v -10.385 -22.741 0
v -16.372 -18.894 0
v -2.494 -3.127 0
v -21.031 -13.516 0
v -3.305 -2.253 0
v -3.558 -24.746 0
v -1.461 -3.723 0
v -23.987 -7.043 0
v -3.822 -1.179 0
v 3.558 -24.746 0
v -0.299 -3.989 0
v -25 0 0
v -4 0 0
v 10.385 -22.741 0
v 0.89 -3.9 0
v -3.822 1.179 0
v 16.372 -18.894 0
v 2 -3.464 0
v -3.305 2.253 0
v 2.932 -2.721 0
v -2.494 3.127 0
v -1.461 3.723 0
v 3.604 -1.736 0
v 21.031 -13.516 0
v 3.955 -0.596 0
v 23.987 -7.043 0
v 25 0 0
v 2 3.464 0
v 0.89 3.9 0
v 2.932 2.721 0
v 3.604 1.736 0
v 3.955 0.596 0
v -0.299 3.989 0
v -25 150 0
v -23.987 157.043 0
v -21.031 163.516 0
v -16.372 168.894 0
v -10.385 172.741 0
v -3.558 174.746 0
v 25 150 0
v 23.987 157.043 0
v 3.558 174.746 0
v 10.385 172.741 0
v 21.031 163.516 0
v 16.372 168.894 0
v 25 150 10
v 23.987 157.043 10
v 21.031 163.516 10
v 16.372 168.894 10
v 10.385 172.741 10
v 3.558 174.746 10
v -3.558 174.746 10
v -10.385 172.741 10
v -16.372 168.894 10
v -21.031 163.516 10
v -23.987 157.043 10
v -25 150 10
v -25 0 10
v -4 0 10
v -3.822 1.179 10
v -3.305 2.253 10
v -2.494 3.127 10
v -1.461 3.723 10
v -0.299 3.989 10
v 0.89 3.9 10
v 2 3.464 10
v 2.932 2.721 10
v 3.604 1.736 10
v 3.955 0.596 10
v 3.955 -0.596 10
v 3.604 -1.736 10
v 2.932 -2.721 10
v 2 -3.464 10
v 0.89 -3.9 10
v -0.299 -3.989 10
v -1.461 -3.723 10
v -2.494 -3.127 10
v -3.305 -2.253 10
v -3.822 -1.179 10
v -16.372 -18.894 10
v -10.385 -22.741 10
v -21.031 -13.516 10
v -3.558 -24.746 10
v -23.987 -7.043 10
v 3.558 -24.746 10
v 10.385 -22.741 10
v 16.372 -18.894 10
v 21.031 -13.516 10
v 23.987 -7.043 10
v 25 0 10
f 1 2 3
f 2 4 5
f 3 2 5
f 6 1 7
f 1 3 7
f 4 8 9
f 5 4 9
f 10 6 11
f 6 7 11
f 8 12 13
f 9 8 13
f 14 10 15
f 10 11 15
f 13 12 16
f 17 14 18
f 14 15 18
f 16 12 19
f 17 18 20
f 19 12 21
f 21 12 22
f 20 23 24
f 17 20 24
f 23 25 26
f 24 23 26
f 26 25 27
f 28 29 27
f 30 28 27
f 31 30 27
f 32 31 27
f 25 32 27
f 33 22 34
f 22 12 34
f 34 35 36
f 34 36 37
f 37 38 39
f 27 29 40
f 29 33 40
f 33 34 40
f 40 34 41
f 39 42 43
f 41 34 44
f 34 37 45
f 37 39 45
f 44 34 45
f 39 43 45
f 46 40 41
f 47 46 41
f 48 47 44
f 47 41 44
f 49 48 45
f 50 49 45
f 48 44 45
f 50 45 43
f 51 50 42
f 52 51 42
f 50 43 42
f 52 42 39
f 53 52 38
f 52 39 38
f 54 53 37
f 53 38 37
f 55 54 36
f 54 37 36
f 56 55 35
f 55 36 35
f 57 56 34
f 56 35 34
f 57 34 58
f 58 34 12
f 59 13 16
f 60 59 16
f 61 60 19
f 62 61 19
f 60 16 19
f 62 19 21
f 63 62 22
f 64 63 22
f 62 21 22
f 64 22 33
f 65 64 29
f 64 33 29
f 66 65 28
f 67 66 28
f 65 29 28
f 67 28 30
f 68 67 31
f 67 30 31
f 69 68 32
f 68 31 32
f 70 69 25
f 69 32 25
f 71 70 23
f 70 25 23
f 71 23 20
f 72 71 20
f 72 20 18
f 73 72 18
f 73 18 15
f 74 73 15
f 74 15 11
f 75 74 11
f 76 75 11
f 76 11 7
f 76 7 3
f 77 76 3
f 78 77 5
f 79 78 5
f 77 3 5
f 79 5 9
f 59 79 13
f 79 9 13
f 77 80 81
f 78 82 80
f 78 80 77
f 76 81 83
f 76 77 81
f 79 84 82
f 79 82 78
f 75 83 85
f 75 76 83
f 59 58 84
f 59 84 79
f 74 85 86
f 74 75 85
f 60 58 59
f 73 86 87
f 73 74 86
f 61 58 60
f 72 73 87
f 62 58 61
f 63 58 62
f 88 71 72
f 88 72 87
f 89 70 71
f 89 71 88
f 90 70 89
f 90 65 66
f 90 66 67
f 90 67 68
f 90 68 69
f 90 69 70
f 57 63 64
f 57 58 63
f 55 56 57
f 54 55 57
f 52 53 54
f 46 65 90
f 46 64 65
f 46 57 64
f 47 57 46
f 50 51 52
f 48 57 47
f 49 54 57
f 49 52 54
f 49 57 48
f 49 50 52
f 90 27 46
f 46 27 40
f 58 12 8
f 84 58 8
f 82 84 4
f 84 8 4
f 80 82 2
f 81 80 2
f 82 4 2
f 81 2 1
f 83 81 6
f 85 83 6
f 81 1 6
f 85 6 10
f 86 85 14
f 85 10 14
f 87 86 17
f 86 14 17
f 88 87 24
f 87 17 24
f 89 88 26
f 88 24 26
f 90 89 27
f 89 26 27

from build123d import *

# Parameters (mm, degrees)
BOSS_EXTRUDE1_DEPTH = 10
SKETCH3_R           = 4
CUT_EXTRUDE1_DEPTH  = 10


with BuildPart() as part:
    # Sketch2 → Boss-Extrude1 (new body)
    with BuildSketch(Plane.XY):
        with BuildLine():
            Line((25, 0), (25, 150))
            ThreePointArc((25, 150), (0, 175), (-25, 150))
            Line((-25, 150), (-25, 0))
            ThreePointArc((-25, 0), (0, -25), (25, 0))
        make_face()
    extrude(amount=BOSS_EXTRUDE1_DEPTH)

    # Sketch3 → Cut-Extrude1 (cut)
    with BuildSketch(Plane(origin=(0, 0, 0), x_dir=(-1, 0, 0), z_dir=(0, 0, -1))):
        Circle(SKETCH3_R)
    extrude(amount=-CUT_EXTRUDE1_DEPTH, mode=Mode.SUBTRACT)


solid = part.part
